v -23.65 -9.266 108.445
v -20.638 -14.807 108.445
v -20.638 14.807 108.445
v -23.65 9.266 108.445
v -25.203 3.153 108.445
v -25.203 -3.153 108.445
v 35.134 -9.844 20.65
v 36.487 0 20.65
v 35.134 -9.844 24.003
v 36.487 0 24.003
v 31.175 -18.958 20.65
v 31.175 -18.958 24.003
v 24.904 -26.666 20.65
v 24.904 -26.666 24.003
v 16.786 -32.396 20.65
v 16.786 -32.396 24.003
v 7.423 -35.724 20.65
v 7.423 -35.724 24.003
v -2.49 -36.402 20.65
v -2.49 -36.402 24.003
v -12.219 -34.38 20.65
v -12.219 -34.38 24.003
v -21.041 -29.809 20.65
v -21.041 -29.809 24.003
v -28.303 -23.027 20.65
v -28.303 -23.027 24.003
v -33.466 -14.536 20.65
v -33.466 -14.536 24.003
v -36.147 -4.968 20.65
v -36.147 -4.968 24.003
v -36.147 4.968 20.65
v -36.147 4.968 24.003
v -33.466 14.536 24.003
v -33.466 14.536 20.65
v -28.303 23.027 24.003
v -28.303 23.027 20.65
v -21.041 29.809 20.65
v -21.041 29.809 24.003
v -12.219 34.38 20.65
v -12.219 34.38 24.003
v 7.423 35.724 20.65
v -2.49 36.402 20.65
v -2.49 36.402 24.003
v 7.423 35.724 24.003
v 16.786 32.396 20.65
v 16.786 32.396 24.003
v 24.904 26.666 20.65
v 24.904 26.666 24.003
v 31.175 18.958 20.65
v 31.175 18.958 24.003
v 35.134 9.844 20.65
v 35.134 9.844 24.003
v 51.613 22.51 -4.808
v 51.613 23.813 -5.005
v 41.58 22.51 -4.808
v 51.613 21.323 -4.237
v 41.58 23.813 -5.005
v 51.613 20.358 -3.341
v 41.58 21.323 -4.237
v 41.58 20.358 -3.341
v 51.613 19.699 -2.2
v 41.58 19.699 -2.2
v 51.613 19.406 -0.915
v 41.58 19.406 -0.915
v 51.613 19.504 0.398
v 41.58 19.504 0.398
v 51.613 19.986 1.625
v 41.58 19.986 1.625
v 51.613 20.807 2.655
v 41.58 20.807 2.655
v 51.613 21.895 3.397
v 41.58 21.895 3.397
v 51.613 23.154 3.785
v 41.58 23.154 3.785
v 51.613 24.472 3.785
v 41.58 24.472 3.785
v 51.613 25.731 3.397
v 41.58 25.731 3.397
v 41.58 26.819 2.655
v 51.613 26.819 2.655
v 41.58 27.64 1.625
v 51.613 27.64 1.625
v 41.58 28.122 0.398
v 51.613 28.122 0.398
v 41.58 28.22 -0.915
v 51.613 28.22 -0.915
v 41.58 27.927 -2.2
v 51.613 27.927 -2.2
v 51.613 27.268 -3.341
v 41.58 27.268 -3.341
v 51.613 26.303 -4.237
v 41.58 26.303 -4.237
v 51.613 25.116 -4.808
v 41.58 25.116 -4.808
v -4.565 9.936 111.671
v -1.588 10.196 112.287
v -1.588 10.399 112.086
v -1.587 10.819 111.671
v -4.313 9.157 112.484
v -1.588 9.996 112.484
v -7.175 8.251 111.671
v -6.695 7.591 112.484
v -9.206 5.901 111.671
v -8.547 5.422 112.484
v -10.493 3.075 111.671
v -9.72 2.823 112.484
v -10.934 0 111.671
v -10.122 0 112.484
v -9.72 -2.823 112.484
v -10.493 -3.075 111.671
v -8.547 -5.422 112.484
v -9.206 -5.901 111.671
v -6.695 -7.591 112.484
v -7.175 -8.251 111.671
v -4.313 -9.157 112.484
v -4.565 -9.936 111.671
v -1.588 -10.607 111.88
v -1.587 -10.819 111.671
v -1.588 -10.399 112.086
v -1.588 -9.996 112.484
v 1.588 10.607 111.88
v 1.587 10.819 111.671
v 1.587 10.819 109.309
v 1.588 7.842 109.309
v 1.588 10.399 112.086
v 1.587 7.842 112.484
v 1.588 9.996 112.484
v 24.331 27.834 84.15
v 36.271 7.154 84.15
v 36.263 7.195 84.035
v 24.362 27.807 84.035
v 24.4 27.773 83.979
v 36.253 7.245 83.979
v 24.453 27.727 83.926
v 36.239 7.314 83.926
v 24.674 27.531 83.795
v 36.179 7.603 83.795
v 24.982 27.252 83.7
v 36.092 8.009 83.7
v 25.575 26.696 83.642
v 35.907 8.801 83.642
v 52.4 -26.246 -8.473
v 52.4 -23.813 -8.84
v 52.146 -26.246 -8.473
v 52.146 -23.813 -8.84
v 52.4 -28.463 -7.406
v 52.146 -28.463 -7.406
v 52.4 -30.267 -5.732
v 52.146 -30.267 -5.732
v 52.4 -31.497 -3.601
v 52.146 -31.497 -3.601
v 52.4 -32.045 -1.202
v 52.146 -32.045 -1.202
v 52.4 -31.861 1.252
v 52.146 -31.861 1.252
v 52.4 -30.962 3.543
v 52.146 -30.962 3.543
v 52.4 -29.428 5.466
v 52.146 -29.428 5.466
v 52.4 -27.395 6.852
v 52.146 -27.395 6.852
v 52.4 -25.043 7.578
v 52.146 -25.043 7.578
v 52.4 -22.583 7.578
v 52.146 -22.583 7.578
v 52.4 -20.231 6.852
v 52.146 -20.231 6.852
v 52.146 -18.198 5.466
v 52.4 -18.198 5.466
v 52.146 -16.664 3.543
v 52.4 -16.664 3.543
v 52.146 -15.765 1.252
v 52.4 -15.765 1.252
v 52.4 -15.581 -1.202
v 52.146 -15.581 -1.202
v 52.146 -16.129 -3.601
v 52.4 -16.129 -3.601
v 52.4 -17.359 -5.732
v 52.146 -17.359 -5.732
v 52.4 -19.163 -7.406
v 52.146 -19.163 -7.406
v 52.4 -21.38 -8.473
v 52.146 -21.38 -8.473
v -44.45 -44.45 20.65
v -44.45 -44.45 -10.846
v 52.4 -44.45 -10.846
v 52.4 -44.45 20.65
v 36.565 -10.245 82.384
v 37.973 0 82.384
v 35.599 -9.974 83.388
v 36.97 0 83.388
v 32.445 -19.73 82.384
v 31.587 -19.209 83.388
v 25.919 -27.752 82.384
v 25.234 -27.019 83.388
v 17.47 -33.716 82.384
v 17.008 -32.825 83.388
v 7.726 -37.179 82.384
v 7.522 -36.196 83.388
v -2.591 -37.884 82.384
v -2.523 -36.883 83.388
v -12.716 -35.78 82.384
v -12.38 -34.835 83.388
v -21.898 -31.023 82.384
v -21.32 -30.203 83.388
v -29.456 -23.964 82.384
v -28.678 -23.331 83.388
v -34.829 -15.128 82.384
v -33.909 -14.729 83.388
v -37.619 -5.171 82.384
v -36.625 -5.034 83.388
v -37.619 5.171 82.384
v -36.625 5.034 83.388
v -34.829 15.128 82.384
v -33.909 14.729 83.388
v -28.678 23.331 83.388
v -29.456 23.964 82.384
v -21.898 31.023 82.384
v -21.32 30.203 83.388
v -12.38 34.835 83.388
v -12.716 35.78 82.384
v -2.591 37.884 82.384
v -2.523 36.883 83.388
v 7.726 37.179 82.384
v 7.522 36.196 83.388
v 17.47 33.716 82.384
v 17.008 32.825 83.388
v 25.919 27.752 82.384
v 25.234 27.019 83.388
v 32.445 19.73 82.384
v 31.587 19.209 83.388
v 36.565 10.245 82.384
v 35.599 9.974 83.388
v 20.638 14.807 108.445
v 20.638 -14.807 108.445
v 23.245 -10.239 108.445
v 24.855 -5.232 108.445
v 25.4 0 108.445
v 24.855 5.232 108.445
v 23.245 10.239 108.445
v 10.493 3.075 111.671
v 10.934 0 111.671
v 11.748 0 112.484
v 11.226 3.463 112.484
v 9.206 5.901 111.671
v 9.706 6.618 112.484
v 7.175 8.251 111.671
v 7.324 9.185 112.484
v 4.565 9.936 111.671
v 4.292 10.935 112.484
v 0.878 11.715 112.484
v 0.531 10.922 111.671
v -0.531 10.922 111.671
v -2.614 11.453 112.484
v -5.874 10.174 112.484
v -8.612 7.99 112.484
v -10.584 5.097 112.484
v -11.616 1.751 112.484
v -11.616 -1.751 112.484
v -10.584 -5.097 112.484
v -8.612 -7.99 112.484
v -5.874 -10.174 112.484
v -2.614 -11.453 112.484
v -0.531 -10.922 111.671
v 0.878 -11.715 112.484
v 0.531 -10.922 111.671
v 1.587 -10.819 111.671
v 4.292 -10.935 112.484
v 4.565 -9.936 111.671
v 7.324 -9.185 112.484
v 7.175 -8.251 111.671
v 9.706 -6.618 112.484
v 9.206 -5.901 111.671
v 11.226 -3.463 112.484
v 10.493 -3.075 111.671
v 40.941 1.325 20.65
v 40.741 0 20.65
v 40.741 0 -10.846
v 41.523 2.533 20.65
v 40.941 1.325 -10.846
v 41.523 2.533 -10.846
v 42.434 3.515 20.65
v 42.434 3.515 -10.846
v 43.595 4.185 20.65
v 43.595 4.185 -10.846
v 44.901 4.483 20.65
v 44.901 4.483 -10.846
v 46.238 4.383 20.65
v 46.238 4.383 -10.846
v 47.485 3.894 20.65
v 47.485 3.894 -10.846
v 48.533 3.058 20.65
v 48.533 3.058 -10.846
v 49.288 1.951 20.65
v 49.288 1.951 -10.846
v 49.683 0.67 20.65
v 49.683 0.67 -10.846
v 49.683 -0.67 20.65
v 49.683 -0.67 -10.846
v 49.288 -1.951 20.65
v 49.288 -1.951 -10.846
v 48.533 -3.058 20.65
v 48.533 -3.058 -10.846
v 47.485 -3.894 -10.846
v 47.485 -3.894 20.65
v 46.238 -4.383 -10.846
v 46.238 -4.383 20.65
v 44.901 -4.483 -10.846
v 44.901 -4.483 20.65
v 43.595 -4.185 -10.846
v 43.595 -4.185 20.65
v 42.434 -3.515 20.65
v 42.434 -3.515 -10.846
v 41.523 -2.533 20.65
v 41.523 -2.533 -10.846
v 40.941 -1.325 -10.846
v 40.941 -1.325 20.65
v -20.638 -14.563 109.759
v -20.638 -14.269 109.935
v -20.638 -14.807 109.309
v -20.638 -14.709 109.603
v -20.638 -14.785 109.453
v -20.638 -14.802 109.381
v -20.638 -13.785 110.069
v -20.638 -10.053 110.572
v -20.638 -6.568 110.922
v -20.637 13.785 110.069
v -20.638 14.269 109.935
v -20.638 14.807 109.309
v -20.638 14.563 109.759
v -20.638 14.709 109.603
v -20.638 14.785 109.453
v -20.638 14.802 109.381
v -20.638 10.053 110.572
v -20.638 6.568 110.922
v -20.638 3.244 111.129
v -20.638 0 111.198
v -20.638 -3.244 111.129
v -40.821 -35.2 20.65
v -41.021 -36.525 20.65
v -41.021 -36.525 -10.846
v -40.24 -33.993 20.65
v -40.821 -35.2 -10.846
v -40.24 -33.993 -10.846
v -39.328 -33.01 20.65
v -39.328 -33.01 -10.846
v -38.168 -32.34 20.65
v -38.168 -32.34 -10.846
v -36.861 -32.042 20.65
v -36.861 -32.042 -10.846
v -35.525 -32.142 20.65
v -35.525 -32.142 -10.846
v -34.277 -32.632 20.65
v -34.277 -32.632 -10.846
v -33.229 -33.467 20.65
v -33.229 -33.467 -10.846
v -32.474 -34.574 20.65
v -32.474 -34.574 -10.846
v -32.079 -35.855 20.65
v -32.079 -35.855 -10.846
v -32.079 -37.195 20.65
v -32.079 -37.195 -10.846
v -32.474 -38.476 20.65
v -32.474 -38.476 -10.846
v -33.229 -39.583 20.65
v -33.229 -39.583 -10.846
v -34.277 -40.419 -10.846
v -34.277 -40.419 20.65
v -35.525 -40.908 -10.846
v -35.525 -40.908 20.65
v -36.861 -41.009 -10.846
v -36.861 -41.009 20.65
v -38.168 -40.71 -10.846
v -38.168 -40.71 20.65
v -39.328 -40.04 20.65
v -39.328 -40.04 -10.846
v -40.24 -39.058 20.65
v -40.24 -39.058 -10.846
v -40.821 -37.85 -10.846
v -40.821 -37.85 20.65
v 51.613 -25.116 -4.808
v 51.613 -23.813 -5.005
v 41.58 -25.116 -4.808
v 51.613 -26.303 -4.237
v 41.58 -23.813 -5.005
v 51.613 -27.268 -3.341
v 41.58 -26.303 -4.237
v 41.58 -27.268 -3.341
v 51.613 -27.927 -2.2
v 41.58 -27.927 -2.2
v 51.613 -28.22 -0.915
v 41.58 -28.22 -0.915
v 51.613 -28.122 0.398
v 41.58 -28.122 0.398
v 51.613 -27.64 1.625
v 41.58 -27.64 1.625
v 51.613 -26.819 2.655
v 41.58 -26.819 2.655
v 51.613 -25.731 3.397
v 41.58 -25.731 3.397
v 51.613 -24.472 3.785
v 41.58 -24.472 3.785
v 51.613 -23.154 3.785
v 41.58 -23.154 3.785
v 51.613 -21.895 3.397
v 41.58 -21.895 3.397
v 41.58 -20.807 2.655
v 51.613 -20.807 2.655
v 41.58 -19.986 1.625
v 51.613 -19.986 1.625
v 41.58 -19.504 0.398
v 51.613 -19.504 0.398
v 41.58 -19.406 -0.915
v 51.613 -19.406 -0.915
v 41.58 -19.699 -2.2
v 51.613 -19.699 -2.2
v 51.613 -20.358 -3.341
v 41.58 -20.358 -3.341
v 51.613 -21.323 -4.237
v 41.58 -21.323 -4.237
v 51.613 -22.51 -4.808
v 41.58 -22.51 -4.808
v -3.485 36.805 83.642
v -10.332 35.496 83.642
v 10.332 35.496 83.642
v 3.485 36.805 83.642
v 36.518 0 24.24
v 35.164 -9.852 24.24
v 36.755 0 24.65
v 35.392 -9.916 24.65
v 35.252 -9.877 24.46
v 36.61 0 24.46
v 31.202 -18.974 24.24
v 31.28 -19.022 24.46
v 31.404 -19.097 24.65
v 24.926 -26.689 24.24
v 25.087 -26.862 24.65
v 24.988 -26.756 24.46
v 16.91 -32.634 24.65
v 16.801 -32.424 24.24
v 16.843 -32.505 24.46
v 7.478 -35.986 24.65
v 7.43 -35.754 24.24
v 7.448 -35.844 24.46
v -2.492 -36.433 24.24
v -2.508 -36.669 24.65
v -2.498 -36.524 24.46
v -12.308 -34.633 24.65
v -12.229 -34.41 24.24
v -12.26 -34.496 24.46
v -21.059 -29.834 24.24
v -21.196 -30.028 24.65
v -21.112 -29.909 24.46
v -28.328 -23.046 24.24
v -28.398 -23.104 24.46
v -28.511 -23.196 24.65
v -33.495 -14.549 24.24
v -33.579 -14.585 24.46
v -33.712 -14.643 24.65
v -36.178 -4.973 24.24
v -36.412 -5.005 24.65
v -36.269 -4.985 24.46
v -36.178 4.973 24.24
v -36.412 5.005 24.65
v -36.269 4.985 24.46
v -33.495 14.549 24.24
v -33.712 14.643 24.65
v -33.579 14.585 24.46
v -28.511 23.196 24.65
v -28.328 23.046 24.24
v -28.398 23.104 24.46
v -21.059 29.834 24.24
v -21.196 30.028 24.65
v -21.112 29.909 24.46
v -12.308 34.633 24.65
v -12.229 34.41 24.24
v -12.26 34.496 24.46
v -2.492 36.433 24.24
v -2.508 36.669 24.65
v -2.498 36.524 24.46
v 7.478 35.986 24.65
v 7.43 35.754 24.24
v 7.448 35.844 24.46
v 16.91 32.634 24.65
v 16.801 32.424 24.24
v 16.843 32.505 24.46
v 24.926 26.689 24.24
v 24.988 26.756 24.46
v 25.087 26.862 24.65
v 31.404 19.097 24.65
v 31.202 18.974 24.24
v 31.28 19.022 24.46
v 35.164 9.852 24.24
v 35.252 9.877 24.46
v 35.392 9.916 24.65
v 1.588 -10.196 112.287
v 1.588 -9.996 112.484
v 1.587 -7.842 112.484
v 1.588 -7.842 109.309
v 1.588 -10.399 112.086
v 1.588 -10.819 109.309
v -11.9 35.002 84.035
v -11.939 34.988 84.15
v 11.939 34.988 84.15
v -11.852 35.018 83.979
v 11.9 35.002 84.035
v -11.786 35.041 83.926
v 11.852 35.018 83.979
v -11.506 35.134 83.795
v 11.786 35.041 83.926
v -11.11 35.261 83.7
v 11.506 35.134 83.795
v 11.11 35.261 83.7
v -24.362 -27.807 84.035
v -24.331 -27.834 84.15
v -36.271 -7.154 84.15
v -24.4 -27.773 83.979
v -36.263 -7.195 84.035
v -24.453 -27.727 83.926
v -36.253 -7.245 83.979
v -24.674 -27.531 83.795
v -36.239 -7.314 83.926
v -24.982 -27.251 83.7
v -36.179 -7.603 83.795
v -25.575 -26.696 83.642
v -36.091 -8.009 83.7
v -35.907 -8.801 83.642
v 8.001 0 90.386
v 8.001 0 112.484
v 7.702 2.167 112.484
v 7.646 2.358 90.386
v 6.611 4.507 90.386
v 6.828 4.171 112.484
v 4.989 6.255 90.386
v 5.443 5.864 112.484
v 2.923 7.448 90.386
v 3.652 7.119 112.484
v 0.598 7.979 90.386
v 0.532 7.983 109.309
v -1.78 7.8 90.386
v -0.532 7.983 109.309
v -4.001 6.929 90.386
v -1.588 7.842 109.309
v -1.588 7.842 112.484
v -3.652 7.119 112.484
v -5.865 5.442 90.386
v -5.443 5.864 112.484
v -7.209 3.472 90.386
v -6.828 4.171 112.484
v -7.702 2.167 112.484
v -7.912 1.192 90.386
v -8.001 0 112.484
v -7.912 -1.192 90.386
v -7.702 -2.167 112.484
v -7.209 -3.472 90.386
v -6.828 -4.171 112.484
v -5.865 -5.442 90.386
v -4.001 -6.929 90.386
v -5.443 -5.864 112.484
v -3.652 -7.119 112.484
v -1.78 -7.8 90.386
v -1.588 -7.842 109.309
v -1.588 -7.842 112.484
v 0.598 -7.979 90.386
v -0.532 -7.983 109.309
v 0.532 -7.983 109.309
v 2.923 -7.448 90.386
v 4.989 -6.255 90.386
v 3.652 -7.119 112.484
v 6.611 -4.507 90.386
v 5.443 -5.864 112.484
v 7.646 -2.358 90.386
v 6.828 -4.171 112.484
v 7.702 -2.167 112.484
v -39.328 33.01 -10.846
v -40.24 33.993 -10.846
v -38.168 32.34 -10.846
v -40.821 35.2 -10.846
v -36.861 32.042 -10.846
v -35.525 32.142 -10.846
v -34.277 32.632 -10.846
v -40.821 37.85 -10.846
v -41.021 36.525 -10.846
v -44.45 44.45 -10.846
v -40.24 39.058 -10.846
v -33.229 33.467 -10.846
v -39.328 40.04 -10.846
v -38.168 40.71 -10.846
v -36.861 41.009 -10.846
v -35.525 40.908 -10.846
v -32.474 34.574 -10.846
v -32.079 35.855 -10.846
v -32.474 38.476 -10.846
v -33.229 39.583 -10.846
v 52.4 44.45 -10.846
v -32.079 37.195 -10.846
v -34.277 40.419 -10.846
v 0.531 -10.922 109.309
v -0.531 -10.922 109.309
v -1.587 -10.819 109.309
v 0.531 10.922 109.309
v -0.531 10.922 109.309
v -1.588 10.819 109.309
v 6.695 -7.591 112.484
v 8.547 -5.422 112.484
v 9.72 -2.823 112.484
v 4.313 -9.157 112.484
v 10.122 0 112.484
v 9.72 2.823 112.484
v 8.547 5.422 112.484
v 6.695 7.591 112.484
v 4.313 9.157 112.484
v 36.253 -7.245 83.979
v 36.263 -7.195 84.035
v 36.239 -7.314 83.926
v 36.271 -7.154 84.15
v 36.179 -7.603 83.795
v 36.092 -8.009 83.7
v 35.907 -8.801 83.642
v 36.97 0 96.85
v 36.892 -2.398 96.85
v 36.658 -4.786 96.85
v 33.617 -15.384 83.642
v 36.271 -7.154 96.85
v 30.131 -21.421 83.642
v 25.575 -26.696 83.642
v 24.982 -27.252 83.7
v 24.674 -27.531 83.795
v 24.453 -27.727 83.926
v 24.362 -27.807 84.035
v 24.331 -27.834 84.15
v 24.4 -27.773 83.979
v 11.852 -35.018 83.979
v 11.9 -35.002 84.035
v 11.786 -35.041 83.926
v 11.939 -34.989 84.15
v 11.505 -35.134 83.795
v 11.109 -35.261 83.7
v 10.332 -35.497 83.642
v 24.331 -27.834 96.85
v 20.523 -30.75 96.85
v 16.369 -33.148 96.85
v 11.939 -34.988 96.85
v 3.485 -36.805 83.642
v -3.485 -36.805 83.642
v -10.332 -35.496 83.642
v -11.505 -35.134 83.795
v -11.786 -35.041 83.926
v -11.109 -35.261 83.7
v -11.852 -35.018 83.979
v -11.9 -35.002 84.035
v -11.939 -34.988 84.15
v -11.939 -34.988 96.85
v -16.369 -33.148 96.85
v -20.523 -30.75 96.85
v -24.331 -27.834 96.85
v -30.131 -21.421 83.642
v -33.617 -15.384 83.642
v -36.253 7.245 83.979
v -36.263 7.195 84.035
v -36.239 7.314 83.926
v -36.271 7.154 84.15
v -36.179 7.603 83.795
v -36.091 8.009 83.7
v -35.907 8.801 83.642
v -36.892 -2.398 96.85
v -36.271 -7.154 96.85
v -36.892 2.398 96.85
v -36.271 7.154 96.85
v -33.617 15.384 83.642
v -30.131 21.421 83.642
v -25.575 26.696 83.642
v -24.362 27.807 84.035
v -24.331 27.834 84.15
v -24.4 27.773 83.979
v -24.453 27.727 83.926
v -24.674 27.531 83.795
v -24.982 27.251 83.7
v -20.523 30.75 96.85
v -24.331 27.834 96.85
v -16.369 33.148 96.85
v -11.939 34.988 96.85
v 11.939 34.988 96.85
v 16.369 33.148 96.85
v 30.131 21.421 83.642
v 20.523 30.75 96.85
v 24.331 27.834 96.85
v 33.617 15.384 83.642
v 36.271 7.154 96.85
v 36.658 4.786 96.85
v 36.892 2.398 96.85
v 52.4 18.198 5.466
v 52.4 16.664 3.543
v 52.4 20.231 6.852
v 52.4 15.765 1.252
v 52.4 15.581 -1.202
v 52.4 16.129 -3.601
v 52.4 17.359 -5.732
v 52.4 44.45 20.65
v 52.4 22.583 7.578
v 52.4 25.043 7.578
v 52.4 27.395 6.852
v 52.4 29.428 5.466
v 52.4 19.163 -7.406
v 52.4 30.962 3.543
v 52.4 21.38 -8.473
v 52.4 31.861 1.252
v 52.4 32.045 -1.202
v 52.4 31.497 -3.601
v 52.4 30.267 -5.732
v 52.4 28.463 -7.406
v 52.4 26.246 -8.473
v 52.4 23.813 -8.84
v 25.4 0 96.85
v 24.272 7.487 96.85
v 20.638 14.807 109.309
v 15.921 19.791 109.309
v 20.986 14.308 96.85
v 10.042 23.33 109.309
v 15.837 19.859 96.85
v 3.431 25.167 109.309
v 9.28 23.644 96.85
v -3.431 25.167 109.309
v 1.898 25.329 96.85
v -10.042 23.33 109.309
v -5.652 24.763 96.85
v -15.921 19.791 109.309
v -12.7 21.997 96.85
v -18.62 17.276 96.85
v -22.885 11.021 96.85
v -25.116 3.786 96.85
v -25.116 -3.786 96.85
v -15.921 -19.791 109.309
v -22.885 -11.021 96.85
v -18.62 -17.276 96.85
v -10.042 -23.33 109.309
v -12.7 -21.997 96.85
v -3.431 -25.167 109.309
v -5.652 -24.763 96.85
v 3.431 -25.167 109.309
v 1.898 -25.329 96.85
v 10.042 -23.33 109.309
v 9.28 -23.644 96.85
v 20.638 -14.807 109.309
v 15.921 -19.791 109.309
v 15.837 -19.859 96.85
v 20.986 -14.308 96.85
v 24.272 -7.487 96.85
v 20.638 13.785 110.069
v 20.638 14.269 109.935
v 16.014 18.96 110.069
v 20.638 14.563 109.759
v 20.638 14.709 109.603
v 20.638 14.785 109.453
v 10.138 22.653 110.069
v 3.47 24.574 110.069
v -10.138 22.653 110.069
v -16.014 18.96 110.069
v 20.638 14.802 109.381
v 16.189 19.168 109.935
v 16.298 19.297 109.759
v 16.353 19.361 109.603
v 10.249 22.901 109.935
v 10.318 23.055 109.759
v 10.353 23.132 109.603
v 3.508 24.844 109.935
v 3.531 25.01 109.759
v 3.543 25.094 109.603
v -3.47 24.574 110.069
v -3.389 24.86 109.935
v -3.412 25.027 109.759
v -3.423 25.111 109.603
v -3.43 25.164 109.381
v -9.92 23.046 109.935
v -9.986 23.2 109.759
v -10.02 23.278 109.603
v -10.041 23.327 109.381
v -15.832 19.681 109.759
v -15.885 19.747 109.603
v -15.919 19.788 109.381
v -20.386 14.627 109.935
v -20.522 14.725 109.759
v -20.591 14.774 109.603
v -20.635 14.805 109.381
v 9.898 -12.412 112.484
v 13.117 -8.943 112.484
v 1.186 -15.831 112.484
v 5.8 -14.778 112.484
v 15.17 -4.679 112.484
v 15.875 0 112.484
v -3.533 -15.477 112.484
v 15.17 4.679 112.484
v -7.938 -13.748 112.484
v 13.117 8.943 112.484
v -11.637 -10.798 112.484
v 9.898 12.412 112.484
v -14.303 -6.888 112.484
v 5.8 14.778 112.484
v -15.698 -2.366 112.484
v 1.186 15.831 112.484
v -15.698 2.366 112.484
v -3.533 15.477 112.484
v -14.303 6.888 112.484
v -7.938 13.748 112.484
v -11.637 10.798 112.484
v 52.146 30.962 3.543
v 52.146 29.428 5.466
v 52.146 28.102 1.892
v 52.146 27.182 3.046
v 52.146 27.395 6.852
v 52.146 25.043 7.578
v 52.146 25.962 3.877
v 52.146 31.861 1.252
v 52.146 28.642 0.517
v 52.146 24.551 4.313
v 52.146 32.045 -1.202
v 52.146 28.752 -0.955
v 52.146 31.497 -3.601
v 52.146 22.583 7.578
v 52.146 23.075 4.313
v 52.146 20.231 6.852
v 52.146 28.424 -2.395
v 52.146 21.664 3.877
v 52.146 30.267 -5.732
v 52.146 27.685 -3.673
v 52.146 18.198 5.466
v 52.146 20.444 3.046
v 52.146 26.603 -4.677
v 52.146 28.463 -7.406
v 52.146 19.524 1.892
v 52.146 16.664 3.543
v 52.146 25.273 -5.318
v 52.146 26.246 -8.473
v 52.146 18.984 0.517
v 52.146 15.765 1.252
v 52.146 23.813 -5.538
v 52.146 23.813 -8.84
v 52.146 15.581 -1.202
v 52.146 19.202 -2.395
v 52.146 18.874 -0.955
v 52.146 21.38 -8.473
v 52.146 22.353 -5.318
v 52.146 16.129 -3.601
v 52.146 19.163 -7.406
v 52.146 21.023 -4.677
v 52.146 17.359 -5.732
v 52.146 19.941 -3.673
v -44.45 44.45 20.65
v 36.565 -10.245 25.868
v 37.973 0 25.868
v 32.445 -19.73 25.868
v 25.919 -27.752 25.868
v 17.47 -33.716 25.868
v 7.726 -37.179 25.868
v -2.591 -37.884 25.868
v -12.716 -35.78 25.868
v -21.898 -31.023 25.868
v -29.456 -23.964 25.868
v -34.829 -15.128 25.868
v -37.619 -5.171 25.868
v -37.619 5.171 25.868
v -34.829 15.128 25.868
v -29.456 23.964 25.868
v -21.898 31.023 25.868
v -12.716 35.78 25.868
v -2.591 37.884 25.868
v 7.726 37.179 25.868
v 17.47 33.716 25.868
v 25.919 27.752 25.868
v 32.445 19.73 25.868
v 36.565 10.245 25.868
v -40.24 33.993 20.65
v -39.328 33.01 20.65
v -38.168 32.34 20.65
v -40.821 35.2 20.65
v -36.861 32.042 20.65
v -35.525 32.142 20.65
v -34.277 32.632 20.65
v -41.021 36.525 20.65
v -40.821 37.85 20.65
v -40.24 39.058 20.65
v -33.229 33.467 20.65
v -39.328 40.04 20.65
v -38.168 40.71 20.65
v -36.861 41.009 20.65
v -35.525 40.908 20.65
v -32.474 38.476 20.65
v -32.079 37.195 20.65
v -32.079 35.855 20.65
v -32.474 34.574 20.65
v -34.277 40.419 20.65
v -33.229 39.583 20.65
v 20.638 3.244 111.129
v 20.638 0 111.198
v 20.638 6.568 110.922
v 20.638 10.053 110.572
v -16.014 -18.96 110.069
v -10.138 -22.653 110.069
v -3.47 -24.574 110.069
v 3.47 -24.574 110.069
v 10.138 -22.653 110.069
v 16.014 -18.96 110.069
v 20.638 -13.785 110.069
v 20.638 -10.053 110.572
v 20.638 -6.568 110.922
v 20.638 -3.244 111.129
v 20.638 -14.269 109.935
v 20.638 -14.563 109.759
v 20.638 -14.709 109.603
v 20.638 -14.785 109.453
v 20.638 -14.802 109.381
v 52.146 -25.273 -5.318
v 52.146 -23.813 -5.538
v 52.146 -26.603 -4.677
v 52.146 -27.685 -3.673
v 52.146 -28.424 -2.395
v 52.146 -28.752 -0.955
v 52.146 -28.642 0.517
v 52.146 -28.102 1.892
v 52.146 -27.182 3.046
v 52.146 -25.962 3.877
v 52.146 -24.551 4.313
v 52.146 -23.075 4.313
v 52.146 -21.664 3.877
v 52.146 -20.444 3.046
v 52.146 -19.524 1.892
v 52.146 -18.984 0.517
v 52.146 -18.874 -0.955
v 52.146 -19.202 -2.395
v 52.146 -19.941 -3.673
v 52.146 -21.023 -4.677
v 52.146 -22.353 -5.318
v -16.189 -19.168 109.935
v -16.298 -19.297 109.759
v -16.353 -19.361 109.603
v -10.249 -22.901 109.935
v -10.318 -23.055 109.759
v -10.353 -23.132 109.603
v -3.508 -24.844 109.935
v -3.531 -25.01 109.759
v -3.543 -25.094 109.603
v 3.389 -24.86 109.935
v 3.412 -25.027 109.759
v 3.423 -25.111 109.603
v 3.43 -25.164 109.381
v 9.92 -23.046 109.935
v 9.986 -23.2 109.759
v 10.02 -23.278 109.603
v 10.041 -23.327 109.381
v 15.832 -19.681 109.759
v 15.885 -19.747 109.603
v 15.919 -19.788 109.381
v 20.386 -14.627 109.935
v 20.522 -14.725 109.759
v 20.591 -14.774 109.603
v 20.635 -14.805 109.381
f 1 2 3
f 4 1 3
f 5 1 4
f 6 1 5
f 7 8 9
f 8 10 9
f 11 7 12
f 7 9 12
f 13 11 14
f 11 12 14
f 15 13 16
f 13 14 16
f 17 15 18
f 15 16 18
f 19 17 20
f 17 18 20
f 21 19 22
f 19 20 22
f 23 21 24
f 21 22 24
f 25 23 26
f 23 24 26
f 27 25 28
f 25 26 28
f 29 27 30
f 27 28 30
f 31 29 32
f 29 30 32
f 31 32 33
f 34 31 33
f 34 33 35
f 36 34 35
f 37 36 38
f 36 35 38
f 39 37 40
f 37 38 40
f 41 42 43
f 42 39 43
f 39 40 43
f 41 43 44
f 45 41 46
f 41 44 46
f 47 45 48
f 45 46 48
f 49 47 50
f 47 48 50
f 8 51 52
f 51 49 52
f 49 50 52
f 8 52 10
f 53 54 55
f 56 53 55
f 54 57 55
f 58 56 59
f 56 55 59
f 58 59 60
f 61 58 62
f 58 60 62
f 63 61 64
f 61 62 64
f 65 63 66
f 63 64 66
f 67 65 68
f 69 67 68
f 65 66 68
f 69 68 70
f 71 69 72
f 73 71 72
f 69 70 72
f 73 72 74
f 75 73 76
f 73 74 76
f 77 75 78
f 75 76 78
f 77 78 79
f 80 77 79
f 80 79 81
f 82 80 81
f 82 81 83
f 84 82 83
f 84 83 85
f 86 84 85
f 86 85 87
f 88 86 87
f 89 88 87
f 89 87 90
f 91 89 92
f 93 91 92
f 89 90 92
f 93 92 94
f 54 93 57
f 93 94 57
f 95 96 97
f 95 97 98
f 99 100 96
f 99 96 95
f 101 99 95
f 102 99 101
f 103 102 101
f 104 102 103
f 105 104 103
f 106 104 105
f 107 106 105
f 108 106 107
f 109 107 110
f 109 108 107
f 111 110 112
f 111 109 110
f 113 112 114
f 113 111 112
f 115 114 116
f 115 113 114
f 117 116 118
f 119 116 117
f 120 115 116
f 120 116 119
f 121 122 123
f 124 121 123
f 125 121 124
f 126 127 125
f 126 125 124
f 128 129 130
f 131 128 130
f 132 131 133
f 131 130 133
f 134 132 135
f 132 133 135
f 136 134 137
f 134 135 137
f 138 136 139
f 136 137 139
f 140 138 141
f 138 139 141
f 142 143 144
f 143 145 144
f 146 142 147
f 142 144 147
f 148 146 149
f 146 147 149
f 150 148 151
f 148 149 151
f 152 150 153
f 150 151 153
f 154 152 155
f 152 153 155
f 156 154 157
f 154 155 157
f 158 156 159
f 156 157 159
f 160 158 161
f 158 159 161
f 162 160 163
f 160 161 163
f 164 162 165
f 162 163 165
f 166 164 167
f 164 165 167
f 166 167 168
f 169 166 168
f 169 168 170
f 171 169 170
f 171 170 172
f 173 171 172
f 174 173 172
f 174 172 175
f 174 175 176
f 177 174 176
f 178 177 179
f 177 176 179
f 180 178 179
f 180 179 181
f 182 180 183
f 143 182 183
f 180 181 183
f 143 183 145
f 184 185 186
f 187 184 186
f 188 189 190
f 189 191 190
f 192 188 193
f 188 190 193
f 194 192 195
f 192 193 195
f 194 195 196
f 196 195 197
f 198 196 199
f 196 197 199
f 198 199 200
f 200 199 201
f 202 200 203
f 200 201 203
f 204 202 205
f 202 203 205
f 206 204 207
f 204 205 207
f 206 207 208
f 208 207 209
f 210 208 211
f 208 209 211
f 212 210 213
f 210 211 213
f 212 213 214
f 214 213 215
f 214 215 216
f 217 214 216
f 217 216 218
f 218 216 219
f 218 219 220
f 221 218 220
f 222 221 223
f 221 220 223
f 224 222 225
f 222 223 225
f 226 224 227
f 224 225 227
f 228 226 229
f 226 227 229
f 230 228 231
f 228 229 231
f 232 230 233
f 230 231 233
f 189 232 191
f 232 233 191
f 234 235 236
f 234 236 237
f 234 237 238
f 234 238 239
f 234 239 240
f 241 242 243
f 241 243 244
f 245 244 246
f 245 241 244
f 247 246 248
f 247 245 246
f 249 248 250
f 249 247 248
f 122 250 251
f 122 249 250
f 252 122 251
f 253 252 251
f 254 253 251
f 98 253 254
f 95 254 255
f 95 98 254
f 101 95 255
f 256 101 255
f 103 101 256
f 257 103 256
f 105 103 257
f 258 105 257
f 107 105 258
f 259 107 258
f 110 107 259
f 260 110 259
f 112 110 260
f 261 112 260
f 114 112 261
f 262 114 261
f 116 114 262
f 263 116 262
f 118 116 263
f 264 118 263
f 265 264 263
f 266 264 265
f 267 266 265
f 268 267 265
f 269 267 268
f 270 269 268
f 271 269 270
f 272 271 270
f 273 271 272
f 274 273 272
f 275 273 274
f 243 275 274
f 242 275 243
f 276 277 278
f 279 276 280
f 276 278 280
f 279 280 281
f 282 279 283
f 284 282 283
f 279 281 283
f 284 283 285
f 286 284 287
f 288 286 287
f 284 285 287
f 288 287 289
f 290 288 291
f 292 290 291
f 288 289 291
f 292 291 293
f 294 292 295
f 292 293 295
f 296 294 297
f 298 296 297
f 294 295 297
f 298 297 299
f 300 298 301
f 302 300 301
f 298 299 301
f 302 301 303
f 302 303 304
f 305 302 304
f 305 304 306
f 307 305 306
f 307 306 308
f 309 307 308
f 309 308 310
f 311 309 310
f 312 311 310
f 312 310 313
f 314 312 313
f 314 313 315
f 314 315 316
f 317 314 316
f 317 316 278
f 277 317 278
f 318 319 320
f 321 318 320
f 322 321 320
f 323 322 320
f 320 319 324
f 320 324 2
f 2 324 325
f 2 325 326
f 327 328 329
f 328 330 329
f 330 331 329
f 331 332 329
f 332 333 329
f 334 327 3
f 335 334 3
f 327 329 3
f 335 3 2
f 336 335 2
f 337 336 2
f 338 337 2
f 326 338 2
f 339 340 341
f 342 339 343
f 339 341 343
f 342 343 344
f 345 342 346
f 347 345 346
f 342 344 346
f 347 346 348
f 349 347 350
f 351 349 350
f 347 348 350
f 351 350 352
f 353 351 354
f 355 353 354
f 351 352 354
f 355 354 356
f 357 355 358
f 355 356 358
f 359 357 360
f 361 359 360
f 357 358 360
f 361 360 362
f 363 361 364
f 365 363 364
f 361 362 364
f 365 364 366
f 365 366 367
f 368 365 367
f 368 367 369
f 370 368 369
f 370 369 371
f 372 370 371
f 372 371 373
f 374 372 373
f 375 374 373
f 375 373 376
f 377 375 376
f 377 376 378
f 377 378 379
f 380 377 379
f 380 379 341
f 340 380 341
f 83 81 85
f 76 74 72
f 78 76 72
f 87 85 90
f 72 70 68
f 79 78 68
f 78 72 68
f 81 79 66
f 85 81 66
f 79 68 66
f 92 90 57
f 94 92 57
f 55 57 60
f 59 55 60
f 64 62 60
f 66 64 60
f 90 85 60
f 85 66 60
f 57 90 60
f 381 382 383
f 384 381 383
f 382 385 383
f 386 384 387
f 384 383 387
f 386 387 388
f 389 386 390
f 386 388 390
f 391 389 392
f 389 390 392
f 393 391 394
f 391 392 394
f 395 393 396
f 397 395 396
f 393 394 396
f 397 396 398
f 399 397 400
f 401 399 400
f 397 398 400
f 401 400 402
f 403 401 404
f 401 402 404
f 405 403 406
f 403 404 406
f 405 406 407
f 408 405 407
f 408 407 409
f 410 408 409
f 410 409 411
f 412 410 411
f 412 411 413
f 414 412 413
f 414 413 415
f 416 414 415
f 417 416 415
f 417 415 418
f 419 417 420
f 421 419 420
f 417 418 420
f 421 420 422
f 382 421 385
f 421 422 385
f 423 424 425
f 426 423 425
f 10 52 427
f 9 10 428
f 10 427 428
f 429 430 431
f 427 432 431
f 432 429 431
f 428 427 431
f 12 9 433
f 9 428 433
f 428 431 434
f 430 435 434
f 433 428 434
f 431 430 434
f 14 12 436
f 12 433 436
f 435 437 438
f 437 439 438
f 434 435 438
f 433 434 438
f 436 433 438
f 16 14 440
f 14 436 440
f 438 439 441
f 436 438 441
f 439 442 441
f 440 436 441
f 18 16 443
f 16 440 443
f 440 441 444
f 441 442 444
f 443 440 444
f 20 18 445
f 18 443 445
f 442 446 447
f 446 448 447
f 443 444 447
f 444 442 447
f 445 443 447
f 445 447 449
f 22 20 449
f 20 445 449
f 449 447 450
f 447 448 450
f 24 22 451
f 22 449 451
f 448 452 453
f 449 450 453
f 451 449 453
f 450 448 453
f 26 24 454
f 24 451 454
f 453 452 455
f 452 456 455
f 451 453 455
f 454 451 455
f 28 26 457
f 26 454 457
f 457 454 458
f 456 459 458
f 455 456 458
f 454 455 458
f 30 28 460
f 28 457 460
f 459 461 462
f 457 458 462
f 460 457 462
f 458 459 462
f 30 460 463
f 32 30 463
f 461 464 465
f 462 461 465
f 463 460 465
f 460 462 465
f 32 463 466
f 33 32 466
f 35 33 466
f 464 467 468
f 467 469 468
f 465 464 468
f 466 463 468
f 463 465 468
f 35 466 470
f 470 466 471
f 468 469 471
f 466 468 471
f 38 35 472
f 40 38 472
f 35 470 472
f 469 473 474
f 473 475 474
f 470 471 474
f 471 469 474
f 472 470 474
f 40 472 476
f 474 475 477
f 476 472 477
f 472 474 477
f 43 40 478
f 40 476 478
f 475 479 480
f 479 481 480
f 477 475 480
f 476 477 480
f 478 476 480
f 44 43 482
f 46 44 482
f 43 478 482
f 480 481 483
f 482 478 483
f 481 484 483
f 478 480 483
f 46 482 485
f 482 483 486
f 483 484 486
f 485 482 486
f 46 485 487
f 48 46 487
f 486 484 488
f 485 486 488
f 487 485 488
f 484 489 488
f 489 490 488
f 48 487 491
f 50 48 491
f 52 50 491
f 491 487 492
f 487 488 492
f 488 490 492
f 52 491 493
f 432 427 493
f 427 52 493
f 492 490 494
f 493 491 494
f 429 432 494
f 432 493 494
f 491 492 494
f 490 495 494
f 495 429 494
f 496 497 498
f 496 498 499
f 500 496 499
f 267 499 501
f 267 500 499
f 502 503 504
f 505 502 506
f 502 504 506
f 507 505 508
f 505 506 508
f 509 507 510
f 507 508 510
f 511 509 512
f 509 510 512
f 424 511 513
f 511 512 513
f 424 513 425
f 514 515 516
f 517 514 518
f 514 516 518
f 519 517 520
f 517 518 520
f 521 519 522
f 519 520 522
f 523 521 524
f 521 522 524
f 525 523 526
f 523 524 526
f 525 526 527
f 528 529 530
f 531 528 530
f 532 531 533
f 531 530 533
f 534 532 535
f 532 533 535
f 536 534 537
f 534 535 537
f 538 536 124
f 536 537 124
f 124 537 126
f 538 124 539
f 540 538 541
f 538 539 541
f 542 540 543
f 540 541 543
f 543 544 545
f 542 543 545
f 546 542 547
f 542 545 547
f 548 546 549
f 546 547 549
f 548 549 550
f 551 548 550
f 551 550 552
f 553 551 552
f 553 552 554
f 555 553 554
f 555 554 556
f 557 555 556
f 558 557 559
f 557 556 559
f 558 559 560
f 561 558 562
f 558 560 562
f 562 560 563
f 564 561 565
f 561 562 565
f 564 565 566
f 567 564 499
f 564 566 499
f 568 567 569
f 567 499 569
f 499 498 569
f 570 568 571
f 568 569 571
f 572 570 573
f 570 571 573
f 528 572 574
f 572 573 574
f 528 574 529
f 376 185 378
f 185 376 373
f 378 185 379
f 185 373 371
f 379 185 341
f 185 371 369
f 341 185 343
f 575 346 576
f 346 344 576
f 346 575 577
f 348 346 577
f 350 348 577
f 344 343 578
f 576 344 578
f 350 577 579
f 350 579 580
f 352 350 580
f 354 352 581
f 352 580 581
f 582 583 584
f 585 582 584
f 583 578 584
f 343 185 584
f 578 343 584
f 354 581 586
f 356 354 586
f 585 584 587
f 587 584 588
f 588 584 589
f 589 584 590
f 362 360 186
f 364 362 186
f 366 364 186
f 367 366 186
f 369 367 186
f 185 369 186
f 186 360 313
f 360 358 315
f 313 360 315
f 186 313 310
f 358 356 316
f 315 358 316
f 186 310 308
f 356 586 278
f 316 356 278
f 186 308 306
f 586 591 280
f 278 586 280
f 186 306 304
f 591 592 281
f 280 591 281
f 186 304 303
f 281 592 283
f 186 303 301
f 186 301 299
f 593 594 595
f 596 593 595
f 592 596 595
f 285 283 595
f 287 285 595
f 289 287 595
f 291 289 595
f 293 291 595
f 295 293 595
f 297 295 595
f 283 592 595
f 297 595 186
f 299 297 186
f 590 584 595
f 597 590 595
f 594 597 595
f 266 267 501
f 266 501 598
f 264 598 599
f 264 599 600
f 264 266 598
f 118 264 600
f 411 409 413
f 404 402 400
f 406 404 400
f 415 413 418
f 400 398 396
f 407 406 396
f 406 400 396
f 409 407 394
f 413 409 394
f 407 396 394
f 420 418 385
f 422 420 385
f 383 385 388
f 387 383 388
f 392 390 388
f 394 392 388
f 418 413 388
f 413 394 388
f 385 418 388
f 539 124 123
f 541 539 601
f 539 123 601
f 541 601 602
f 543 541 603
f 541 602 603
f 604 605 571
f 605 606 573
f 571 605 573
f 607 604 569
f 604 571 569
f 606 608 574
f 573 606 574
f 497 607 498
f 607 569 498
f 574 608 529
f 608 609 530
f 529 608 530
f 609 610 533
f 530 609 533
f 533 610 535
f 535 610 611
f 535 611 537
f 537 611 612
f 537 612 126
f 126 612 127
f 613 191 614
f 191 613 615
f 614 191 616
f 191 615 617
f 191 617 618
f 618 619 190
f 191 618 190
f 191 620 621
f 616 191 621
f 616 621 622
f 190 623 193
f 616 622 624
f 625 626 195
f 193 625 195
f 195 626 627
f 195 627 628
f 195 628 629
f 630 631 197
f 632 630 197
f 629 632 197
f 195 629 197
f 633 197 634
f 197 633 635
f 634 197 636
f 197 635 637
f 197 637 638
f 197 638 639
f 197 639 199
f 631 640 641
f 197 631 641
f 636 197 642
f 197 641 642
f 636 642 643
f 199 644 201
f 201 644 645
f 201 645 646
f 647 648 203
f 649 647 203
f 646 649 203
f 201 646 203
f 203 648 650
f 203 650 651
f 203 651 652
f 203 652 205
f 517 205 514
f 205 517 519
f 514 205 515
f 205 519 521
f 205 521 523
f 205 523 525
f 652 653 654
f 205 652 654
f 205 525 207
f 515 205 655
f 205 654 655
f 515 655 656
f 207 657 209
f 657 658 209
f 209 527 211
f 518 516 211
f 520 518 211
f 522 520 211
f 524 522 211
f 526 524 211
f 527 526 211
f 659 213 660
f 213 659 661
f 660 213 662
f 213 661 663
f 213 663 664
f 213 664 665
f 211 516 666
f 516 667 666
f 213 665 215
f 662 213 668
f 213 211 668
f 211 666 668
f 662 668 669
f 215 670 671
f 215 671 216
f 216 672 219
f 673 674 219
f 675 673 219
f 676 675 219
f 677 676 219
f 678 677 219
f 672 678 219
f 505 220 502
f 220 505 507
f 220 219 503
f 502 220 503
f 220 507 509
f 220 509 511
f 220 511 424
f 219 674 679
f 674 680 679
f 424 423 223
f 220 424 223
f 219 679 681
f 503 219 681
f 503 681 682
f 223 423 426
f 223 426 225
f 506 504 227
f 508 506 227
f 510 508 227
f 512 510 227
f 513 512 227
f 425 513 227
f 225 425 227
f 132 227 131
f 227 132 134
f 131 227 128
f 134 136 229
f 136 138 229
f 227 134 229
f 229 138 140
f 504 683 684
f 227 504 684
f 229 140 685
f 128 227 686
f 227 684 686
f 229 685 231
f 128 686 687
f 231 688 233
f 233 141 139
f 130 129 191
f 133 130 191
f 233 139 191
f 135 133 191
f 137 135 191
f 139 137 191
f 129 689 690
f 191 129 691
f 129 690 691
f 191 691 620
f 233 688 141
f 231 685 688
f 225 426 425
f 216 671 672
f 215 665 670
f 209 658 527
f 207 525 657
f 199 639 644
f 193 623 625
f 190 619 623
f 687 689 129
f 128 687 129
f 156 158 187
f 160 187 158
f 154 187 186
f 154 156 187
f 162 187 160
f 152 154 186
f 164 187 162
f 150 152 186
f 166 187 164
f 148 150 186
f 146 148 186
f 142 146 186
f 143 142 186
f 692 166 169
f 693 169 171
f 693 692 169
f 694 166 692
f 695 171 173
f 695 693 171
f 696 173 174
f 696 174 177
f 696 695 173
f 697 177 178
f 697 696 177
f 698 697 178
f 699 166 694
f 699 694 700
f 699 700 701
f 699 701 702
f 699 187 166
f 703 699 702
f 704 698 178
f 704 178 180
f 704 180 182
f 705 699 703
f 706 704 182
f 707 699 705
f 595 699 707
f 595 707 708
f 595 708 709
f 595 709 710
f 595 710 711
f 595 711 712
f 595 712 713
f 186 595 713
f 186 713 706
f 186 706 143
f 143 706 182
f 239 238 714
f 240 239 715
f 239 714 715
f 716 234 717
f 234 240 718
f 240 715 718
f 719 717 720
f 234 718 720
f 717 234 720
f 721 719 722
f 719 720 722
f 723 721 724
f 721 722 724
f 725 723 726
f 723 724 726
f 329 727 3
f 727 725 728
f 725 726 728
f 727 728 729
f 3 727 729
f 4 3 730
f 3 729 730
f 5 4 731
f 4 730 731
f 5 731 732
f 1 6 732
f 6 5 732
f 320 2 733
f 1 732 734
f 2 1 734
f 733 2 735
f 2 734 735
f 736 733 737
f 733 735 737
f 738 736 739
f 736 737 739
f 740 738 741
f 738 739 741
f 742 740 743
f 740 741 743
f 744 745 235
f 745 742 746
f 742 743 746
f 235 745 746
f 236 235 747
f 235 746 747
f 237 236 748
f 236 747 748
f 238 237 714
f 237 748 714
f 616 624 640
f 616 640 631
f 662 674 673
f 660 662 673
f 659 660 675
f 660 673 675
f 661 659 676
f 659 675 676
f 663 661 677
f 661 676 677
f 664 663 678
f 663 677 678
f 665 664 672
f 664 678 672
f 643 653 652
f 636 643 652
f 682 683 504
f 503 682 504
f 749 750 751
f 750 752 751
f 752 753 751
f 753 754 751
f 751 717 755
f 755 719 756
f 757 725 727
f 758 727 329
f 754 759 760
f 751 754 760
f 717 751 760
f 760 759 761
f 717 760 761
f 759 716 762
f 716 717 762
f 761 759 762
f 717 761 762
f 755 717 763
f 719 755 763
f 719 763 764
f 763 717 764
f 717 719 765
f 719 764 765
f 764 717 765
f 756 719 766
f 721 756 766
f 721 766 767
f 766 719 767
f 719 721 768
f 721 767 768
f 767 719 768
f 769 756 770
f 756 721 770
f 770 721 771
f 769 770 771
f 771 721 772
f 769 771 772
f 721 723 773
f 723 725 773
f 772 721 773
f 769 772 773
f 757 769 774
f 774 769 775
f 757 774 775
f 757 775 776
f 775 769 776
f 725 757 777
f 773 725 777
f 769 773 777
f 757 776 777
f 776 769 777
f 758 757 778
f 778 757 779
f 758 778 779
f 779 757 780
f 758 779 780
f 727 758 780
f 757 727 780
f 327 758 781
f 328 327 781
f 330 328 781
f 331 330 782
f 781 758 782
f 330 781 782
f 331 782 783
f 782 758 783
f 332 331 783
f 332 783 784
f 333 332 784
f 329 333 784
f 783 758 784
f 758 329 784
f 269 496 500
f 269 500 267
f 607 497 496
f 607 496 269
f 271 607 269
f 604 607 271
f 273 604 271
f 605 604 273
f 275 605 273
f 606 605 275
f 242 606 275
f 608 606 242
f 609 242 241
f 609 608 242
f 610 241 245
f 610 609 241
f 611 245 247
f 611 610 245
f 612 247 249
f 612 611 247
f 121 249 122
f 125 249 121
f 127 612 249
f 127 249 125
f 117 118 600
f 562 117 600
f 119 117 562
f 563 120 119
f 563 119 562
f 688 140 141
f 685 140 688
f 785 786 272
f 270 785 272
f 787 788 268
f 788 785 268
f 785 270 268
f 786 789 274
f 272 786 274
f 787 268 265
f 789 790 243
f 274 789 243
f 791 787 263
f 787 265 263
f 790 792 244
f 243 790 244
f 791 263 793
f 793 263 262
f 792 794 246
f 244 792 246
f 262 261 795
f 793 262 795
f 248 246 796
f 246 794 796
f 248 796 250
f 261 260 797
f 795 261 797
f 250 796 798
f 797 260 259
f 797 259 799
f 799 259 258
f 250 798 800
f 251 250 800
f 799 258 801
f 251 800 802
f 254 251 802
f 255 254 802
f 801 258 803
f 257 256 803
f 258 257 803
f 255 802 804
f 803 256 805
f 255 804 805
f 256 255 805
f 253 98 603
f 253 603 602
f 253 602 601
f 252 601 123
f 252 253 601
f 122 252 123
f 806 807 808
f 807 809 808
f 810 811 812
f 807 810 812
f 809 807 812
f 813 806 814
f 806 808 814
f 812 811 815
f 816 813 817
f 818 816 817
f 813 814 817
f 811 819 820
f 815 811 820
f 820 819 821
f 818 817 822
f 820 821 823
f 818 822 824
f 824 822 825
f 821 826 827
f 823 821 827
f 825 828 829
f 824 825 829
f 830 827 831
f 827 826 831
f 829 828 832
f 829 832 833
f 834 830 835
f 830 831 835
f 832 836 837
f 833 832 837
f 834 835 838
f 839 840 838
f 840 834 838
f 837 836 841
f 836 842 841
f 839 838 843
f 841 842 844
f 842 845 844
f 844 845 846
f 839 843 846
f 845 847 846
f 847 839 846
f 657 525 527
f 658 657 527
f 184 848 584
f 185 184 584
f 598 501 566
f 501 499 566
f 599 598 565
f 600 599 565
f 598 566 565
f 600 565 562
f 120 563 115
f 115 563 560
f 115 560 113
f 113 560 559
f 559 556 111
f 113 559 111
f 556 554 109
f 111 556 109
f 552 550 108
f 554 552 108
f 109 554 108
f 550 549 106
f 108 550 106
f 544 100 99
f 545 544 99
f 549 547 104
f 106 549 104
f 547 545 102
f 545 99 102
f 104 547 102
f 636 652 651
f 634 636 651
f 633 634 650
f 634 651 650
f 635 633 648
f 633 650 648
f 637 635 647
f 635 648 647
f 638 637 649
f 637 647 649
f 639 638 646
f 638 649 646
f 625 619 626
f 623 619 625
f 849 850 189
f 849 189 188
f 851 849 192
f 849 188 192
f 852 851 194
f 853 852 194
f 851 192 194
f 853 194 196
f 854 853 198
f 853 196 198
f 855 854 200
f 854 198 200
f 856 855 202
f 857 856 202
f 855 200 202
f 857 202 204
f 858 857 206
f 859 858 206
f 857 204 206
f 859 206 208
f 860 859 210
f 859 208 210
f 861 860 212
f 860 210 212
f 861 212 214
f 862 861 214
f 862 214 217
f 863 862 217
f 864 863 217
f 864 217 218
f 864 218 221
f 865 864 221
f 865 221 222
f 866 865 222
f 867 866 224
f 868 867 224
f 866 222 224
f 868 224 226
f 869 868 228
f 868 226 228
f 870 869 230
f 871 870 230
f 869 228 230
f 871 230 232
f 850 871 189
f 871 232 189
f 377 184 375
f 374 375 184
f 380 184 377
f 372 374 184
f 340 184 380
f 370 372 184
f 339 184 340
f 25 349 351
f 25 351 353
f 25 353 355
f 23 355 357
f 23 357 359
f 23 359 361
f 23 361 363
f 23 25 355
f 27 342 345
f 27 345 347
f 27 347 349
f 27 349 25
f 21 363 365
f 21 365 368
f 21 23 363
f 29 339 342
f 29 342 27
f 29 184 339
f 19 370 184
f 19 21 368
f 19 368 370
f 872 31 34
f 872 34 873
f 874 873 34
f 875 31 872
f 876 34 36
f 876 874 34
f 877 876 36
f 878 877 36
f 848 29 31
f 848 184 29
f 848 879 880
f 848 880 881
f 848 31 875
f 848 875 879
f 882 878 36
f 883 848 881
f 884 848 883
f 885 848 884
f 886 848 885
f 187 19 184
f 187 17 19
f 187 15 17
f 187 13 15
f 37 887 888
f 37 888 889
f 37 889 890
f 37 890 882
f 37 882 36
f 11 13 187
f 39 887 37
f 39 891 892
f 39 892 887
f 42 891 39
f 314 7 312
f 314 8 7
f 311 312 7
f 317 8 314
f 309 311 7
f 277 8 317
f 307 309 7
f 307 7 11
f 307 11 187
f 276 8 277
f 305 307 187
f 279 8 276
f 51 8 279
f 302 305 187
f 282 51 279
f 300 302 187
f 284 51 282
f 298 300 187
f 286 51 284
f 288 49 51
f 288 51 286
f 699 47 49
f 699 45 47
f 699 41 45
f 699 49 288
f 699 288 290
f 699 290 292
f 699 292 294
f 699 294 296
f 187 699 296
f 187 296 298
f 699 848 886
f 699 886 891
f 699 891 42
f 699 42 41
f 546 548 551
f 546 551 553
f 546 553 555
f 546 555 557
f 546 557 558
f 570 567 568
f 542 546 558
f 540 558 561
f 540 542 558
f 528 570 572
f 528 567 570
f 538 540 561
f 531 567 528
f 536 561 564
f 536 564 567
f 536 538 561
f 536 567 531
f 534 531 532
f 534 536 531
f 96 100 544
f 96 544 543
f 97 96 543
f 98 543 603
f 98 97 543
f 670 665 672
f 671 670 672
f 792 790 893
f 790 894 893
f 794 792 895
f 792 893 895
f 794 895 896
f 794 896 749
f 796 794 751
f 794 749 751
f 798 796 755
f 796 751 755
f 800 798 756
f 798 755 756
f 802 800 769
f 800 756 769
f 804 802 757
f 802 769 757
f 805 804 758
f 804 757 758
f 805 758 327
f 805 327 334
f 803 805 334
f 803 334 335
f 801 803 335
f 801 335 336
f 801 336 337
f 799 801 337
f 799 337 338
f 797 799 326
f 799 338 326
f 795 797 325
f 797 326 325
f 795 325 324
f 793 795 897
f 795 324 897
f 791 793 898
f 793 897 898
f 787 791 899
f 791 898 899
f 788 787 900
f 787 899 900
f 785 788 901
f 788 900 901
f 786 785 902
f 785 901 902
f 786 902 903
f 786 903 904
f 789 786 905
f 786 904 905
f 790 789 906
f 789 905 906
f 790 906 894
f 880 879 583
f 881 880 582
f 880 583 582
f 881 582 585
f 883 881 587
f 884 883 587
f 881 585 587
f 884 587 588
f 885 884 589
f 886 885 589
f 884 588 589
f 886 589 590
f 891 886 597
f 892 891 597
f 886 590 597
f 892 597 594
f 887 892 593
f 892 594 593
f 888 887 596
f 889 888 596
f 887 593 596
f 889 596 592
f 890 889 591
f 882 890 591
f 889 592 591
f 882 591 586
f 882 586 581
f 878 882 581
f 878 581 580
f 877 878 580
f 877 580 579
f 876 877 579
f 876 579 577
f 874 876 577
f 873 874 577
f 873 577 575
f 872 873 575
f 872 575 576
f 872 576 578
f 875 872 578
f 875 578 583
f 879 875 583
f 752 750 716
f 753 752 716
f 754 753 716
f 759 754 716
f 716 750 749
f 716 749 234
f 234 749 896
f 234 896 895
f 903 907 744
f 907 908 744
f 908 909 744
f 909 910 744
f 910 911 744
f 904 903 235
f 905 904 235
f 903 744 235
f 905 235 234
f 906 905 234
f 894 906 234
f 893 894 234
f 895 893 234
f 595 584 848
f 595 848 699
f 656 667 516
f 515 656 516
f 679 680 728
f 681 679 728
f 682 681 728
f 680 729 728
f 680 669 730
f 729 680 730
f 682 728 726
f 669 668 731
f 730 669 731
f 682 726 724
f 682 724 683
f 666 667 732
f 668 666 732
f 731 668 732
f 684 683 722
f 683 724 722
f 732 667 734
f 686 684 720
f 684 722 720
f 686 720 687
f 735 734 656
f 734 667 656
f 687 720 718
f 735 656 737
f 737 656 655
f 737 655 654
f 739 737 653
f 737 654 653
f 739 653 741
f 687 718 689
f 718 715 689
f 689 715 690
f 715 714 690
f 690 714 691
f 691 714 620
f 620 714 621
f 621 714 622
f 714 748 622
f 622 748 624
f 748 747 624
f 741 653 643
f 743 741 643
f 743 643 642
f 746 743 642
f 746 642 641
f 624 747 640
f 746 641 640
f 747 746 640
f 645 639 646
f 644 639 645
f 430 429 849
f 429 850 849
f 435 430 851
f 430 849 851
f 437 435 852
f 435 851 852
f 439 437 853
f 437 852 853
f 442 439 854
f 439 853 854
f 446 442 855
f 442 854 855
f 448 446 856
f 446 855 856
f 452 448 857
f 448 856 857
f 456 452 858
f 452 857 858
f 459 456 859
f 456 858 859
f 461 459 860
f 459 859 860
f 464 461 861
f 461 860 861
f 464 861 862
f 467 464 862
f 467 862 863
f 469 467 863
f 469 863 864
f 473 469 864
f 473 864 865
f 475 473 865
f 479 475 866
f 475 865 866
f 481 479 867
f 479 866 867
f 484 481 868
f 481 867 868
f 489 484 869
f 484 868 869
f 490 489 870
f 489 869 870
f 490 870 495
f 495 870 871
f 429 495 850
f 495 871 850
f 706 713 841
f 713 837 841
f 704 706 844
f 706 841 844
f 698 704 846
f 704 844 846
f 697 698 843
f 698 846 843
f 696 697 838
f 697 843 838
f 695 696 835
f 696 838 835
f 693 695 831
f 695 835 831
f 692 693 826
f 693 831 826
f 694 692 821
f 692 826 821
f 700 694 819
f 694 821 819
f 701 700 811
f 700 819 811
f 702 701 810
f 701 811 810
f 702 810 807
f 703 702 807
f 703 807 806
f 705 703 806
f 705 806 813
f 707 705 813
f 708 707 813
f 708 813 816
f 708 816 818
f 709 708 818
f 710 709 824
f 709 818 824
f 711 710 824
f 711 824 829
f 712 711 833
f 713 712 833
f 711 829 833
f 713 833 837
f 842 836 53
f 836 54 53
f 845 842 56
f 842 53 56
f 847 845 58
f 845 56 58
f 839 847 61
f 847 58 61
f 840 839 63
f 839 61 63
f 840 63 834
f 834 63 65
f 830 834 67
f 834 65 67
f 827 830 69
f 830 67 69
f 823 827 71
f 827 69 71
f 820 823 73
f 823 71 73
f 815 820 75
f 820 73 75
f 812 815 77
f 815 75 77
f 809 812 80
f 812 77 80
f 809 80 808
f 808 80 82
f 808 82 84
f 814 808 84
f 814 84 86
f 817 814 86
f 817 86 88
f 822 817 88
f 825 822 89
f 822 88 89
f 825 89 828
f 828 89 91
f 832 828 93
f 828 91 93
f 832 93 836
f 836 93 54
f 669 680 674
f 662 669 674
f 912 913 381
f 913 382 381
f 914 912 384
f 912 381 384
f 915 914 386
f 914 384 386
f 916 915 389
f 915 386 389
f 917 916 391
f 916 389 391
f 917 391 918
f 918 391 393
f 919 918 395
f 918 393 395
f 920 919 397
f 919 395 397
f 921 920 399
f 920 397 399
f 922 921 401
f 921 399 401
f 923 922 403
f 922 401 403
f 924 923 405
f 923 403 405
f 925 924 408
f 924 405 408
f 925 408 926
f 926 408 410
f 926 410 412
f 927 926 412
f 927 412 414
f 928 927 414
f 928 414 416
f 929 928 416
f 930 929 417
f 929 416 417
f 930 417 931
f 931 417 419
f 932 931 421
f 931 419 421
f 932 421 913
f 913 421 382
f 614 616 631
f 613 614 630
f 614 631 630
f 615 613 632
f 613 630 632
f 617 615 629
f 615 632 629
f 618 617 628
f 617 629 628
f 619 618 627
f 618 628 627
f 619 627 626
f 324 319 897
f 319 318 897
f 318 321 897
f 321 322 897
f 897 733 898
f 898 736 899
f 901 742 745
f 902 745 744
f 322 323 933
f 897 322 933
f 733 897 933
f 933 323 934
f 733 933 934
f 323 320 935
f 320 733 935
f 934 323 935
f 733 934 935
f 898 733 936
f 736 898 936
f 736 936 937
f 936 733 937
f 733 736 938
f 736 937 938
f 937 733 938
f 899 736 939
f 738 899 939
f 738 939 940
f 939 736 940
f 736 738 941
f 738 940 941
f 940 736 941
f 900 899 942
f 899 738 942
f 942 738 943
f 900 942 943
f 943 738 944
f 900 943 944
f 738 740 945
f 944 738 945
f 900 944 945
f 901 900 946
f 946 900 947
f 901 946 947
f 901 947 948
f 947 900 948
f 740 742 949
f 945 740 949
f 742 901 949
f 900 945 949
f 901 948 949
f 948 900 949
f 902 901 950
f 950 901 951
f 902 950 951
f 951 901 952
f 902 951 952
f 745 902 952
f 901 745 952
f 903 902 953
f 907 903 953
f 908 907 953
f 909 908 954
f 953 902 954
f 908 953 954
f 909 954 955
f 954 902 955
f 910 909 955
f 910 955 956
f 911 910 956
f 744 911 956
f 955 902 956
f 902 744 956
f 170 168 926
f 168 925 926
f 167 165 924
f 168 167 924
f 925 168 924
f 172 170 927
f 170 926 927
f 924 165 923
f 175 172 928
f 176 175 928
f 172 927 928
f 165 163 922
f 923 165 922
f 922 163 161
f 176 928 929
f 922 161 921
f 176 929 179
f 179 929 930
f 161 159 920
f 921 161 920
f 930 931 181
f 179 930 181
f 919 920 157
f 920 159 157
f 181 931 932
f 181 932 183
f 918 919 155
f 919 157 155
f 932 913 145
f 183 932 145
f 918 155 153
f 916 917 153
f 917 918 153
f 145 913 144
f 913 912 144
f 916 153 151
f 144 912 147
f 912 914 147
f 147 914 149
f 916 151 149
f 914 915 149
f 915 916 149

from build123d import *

# Parameters (mm, degrees)
CUT_EXTRUDE1_DEPTH      = 38.973
CIRPATTERN1_COUNT       = 6
SKETCH6_W               = 96.85
SKETCH6_H               = 31.496
EXTRUDE1_DEPTH          = 44.45
SKETCH4_R               = 8.001
CUT_EXTRUDE2_DEPTH      = 22.098
HOLE1_D                 = 8.992
HOLE1_DEPTH             = 31.496
LPATTERN1_COUNT         = 2
LPATTERN1_PITCH         = 47.626
SKETCH12_W              = 10
SKETCH12_H              = 10
CUT_EXTRUDE3_DEPTH      = 45.45
CUT_EXTRUDE3_DEPTH_BACK = 45.45
CUT_EXTRUDE4_DEPTH      = 3.175


with BuildPart() as part:
    # Sketch1 → Revolve1 (revolve)
    with BuildSketch(Plane(origin=(0, 0, 0), x_dir=(0, 0, -1), z_dir=(1, 0, 0)), mode=Mode.PRIVATE) as revolve1_sk:
        with BuildLine():
            Line((0, 0), (0, 13.9954))
            Line((0, 13.9954), (-4.6736, 13.9954))
            Line((-4.6736, 13.9954), (-4.6736, 36.487))
            Line((-4.6736, 36.487), (-24.003, 36.487))
            ThreePointArc((-24.003, 36.487), (-24.352925731, 36.556604555), (-24.649578441, 36.754821559))
            Line((-24.649578441, 36.754821559), (-25.867756881, 37.973))
            Line((-25.867756881, 37.973), (-82.3845, 37.973))
            Line((-82.3845, 37.973), (-83.388, 36.9695))
            Line((-83.388, 36.9695), (-96.85, 36.9695))
            Line((-96.85, 36.9695), (-96.85, 0))
            Line((-96.85, 0), (0, 0))
        make_face()
    revolve(revolve1_sk.sketch.rotate(Axis((0, 0, 0), (0, 0, -1)), 90), axis=Axis((0, 0, 0), (0, 0, -1)))  # turned: the seam where the file's is

    # Sketch2 → Cut-Extrude1 (cut, symmetric)
    with BuildSketch(Plane(origin=(0, 0, 0), x_dir=(0, 0, -1), z_dir=(1, 0, 0))):
        with BuildLine():
            Line((-96.85, 34.9885), (-84.15, 34.9885))
            ThreePointArc((-84.15, 34.9885), (-83.790789755, 35.137289755), (-83.642, 35.4965))
            Line((-83.642, 35.4965), (-83.642, 38.1635))
            Line((-83.642, 38.1635), (-96.85, 38.1635))
            Line((-96.85, 38.1635), (-96.85, 34.9885))
        make_face()
    cut_extrude1 = extrude(amount=CUT_EXTRUDE1_DEPTH, both=True, mode=Mode.SUBTRACT)

    # CirPattern1: Cut-Extrude1 ×6 about axis
    cirpattern1_axis = Axis((0, 0, 0), (0, 0, 1))
    for i in range(1, CIRPATTERN1_COUNT):
        add(cut_extrude1.rotate(cirpattern1_axis, i * 360 / CIRPATTERN1_COUNT), mode=Mode.SUBTRACT)

    # Sketch6 → Extrude1 (add, symmetric)
    with BuildSketch(Plane(origin=(0, 0, 0), x_dir=(1, 0, 0), z_dir=(0, 1, 0))):
        with Locations((3.975, -4.902)):
            Rectangle(SKETCH6_W, SKETCH6_H)
    extrude(amount=EXTRUDE1_DEPTH, both=True)

    # Sketch3 → Revolve2 (revolve)
    with BuildSketch(Plane(origin=(0, 0, 0), x_dir=(0, 0, -1), z_dir=(1, 0, 0)), mode=Mode.PRIVATE) as revolve2_sk:
        with BuildLine():
            Line((-112.484, 0), (-112.484, 15.875))
            Line((-112.484, 15.875), (-110.068780748, 24.818188244))
            ThreePointArc((-110.068780748, 24.818188244), (-109.787479807, 25.237840839), (-109.309, 25.4))
            Line((-109.309, 25.4), (-96.85, 25.4))
            Line((-96.85, 25.4), (-96.85, 0))
            Line((-96.85, 0), (-112.484, 0))
        make_face()
    revolve(revolve2_sk.sketch.rotate(Axis((0, 0, 0), (0, 0, 1)), 270), axis=Axis((0, 0, 0), (0, 0, 1)))  # turned: the seam where the file's is

    # Sketch4 → Cut-Extrude2 (cut)
    with BuildSketch(Plane.XY.offset(112.484)):
        Circle(SKETCH4_R)
    extrude(amount=-CUT_EXTRUDE2_DEPTH, mode=Mode.SUBTRACT)

    # Hole1
    with Locations(Plane.XY.offset(20.65)):
        with Locations((-36.5252, 36.5252), (-36.5252, -36.5252), (45.2374, 0)):
            Hole(HOLE1_D / 2, depth=HOLE1_DEPTH)

    # Sketch9 → Cut-Revolve2 (revolve, cut)
    with BuildSketch(Plane(origin=(0, -23.813, 0), x_dir=(-1, 0, 0), z_dir=(0, 1, 0)), mode=Mode.PRIVATE) as cut_revolve2_sk:
        Polygon((-52.4, 7.67), (-52.146, 7.67), (-52.146, 4.368), (-51.6126, 3.8346), (-41.5796, 3.8346), (-41.5796, -0.585), (-52.4, -0.585), align=None)
    cut_revolve2 = revolve(cut_revolve2_sk.sketch.rotate(Axis((52.4, -23.813, -0.585), (-1, 0, 0)), 180), axis=Axis((52.4, -23.813, -0.585), (-1, 0, 0)), mode=Mode.SUBTRACT)  # turned: the seam where the file's is

    # LPattern1: Cut-Revolve2 ×2
    with Locations(*[(0, i * LPATTERN1_PITCH, 0) for i in range(1, LPATTERN1_COUNT)]):
        add(cut_revolve2, mode=Mode.SUBTRACT)

    # Sketch12 → Cut-Extrude3 (cut, two sides)
    with BuildSketch(Plane(origin=(0, 0, 0), x_dir=(0, 0, -1), z_dir=(0, 1, 0))) as cut_extrude3_sk:
        with Locations((-113.445, 25.6375)):
            Rectangle(SKETCH12_W, SKETCH12_H)
        with Locations((-113.445, -25.6375)):
            Rectangle(SKETCH12_W, SKETCH12_H)
    extrude(amount=CUT_EXTRUDE3_DEPTH, mode=Mode.SUBTRACT)
    extrude(cut_extrude3_sk.sketch, amount=-CUT_EXTRUDE3_DEPTH_BACK, mode=Mode.SUBTRACT)

    # Sketch13 → Cut-Revolve4 (revolve, cut)
    with BuildSketch(Plane(origin=(0, 0, 0), x_dir=(0, 0, -1), z_dir=(1, 0, 0)), mode=Mode.PRIVATE) as cut_revolve4_sk:
        Polygon((-112.484, 11.7475), (-111.671, 10.9345), (-112.484, 10.1215), align=None)
    revolve(cut_revolve4_sk.sketch.rotate(Axis((0, 0, 0), (0, 0, 1)), 270), axis=Axis((0, 0, 0), (0, 0, 1)), mode=Mode.SUBTRACT)  # turned: the seam where the file's is

    # Sketch14 → Cut-Extrude4 (cut)
    with BuildSketch(Plane.XY.offset(112.484)):
        with BuildLine():
            Line((-1.5875, -10.818647513), (-1.5875, 10.818647513))
            ThreePointArc((-1.5875, 10.818647513), (0, 10.9345), (1.5875, 10.818647513))
            Line((1.5875, 10.818647513), (1.5875, -10.818647513))
            ThreePointArc((1.5875, -10.818647513), (0, -10.9345), (-1.5875, -10.818647513))
        make_face()
    extrude(amount=-CUT_EXTRUDE4_DEPTH, mode=Mode.SUBTRACT)


solid = part.part
